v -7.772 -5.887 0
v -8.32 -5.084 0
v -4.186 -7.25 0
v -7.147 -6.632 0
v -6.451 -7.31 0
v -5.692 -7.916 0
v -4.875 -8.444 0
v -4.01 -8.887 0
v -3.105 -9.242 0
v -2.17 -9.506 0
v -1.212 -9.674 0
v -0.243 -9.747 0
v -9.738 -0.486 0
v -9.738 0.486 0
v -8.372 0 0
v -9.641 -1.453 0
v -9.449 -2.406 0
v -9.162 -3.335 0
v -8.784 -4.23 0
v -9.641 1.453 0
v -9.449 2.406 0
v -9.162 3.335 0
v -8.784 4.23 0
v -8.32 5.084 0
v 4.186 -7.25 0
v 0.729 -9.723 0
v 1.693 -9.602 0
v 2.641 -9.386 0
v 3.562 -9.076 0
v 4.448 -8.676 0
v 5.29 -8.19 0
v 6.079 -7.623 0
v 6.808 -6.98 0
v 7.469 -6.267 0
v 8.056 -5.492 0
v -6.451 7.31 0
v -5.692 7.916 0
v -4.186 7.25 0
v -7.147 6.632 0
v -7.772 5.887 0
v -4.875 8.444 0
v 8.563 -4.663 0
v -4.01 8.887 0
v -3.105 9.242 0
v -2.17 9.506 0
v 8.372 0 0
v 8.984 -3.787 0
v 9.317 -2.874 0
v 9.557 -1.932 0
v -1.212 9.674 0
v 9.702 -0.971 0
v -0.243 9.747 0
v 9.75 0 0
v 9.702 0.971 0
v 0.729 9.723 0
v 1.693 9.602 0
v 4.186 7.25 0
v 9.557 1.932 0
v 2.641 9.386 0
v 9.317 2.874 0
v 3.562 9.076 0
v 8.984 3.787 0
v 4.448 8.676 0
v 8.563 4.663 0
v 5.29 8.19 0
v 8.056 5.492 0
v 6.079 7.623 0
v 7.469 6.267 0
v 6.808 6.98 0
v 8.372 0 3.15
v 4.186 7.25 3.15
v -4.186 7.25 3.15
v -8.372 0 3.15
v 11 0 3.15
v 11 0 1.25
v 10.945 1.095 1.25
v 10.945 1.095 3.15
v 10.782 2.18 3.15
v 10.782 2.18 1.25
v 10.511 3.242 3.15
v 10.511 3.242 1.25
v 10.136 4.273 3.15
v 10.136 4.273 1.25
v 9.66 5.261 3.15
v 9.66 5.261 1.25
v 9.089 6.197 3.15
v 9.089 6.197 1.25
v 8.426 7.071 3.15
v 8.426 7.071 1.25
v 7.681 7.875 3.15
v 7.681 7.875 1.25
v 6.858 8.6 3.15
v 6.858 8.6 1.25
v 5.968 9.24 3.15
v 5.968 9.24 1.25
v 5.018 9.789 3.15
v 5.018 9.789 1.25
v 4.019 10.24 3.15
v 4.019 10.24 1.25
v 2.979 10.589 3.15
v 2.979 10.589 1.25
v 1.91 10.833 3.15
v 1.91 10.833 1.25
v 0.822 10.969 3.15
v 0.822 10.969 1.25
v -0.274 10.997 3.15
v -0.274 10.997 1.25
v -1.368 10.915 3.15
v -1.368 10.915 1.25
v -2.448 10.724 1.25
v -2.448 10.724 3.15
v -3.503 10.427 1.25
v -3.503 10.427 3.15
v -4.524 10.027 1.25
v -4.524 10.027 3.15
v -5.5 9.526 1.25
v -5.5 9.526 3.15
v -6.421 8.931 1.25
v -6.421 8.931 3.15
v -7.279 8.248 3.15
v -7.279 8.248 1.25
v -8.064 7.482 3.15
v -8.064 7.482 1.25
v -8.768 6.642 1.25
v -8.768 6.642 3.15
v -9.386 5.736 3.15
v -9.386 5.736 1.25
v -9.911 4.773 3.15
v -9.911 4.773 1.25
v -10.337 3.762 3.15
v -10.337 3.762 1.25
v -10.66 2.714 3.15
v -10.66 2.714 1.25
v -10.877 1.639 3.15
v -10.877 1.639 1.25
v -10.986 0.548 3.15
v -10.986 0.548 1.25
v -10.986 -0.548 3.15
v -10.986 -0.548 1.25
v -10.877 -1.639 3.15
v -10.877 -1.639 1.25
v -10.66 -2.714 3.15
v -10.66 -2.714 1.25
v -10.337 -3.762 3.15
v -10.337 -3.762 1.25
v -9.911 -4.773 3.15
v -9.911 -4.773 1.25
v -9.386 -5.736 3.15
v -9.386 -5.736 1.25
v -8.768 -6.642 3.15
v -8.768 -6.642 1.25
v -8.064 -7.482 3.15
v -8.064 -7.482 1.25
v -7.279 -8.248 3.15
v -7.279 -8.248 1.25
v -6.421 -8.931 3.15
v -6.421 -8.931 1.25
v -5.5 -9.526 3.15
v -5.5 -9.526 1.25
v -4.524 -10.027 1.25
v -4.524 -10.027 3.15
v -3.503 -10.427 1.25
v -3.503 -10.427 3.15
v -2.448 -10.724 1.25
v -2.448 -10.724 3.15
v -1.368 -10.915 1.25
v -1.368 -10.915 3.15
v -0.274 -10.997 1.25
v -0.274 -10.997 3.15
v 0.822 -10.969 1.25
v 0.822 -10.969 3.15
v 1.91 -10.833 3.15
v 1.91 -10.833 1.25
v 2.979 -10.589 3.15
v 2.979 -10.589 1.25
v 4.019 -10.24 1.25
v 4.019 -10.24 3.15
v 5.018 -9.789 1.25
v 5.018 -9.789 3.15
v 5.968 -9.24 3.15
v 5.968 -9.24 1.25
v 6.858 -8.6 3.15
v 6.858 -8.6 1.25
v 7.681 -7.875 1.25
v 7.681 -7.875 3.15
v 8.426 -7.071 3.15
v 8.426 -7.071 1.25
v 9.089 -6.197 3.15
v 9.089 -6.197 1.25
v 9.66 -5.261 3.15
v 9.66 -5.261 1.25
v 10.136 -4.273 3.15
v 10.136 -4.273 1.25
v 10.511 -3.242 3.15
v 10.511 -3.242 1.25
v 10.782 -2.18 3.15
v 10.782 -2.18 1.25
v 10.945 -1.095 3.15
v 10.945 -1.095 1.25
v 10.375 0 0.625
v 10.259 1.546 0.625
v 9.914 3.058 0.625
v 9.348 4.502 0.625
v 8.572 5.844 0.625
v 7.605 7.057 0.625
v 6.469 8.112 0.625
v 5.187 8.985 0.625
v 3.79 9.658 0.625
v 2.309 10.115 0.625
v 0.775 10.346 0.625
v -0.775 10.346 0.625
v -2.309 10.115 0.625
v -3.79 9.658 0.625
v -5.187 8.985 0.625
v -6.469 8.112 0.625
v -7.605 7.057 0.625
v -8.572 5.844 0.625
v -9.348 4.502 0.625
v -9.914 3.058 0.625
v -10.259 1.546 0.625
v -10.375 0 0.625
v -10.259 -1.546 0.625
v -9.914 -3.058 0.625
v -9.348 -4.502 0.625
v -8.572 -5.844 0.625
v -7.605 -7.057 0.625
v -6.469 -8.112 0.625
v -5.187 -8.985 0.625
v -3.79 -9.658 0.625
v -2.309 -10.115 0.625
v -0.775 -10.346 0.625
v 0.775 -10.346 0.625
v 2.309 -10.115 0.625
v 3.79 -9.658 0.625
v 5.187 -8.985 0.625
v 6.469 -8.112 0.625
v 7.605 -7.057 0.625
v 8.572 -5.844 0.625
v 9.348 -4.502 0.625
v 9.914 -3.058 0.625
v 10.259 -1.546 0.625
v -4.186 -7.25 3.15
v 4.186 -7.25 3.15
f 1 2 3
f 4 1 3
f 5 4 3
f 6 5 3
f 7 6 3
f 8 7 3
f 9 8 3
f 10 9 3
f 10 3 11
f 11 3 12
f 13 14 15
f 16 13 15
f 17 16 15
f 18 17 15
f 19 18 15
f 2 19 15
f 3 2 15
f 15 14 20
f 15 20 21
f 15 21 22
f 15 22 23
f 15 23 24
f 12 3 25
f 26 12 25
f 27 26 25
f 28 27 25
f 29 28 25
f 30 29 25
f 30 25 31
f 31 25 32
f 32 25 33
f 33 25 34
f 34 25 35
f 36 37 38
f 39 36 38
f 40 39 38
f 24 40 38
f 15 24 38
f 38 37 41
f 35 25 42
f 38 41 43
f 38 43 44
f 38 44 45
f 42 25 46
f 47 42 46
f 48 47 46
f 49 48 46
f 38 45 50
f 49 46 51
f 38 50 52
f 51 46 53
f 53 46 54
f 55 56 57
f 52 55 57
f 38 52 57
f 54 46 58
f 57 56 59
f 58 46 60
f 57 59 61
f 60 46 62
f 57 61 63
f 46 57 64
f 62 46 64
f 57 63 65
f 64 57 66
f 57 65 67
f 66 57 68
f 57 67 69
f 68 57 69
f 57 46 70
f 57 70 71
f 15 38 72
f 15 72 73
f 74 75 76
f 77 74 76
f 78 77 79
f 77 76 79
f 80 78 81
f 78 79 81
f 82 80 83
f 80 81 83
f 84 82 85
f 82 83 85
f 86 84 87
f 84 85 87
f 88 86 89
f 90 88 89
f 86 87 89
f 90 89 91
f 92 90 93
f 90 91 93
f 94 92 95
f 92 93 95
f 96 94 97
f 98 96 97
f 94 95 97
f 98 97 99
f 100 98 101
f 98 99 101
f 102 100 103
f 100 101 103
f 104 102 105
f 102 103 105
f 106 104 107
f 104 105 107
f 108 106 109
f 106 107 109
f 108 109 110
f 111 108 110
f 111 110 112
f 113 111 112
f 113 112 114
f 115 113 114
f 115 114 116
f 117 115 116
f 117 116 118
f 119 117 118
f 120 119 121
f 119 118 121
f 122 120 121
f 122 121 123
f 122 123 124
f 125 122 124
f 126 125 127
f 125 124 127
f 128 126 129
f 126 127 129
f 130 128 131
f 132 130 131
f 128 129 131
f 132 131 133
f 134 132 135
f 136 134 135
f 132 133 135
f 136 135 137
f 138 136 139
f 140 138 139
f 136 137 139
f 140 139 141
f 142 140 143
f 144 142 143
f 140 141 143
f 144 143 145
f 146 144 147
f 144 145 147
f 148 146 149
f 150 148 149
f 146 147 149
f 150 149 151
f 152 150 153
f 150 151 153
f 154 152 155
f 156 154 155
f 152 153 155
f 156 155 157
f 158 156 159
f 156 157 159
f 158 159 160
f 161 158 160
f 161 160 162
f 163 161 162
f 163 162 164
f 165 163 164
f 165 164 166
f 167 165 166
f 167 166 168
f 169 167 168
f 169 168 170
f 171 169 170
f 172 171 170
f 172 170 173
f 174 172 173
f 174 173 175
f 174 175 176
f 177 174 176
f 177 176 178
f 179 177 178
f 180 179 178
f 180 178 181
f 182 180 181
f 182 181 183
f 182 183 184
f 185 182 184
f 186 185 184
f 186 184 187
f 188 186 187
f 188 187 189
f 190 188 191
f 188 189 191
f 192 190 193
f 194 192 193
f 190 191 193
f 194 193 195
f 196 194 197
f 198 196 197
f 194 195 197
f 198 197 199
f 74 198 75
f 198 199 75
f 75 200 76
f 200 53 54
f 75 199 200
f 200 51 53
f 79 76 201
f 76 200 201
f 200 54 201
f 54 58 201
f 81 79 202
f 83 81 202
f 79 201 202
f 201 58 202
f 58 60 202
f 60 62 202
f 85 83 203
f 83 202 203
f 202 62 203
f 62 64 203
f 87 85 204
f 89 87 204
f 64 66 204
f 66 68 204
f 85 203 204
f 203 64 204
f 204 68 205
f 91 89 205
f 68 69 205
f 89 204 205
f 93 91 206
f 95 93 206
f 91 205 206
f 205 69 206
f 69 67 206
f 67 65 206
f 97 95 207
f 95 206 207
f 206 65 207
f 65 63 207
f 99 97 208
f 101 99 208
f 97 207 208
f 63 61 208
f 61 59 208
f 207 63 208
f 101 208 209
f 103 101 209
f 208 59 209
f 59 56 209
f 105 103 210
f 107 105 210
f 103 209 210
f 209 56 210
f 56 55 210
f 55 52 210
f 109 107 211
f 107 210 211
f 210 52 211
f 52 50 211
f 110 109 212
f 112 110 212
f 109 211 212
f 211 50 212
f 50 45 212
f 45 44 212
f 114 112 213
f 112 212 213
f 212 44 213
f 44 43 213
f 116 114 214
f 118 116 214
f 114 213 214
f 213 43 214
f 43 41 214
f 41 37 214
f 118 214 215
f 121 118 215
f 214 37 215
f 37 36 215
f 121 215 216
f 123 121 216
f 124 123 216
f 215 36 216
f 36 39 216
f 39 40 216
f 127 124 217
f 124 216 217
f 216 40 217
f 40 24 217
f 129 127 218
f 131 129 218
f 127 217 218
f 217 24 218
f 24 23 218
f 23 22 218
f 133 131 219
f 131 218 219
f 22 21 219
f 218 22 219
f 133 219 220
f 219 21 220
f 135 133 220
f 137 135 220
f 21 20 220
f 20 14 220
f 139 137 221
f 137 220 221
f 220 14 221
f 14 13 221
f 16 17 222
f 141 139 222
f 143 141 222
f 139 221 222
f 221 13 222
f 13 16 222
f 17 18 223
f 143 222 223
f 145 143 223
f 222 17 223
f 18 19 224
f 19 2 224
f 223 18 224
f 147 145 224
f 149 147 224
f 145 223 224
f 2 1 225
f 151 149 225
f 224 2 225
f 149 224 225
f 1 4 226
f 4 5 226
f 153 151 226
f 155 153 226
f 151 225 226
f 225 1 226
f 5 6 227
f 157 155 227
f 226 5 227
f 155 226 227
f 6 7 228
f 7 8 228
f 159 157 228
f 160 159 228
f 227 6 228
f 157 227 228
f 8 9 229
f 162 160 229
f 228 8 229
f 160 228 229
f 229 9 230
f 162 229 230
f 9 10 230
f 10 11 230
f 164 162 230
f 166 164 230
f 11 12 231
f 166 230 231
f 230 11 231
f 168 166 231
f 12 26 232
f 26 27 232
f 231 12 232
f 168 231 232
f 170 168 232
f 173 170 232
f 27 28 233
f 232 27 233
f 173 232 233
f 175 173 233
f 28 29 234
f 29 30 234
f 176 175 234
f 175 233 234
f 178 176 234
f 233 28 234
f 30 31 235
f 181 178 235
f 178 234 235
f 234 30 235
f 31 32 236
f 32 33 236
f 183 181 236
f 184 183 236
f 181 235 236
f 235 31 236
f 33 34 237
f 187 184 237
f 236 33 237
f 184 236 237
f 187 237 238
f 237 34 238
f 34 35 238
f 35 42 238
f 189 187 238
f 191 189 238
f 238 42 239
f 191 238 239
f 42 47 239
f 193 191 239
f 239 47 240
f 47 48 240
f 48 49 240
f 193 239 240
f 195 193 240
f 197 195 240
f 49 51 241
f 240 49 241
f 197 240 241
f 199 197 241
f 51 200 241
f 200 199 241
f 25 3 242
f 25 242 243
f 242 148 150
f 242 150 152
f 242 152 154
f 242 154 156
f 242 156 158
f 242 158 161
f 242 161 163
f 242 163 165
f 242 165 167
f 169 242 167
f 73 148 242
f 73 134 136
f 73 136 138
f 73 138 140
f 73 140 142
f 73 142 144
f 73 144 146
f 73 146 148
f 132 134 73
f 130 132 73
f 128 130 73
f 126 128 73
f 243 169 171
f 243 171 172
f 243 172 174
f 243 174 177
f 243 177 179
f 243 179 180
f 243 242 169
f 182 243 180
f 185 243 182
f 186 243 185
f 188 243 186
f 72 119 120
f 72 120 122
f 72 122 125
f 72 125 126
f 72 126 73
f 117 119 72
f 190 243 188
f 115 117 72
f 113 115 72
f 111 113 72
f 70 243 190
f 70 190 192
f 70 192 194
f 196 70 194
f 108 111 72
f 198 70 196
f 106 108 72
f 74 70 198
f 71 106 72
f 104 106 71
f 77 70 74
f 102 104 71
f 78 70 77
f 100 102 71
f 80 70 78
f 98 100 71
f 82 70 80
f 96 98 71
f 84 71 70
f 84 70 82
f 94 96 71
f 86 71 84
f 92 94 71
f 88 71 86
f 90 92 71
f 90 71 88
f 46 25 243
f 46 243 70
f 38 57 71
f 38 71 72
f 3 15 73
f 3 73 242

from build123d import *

# Parameters (mm, degrees)
SKETCH1_R           = 11
BOSS_EXTRUDE1_DEPTH = 3.15
CHAMFER1_SIZE       = 1.25


with BuildPart() as part:
    # Sketch1 → Boss-Extrude1 (new body)
    with BuildSketch(Plane.XY):
        Circle(SKETCH1_R)
        Polygon((8.371578903, 0), (4.185789452, 7.25), (-4.185789452, 7.25), (-8.371578903, 0), (-4.185789452, -7.25), (4.185789452, -7.25), align=None, mode=Mode.SUBTRACT)
    extrude(amount=BOSS_EXTRUDE1_DEPTH)

    # Chamfer1
    chamfer1_edges = [part.edges().sort_by_distance(p)[0] for p in [
        (-11, 0, 0),
    ]]
    chamfer(chamfer1_edges, length=CHAMFER1_SIZE)


solid = part.part
